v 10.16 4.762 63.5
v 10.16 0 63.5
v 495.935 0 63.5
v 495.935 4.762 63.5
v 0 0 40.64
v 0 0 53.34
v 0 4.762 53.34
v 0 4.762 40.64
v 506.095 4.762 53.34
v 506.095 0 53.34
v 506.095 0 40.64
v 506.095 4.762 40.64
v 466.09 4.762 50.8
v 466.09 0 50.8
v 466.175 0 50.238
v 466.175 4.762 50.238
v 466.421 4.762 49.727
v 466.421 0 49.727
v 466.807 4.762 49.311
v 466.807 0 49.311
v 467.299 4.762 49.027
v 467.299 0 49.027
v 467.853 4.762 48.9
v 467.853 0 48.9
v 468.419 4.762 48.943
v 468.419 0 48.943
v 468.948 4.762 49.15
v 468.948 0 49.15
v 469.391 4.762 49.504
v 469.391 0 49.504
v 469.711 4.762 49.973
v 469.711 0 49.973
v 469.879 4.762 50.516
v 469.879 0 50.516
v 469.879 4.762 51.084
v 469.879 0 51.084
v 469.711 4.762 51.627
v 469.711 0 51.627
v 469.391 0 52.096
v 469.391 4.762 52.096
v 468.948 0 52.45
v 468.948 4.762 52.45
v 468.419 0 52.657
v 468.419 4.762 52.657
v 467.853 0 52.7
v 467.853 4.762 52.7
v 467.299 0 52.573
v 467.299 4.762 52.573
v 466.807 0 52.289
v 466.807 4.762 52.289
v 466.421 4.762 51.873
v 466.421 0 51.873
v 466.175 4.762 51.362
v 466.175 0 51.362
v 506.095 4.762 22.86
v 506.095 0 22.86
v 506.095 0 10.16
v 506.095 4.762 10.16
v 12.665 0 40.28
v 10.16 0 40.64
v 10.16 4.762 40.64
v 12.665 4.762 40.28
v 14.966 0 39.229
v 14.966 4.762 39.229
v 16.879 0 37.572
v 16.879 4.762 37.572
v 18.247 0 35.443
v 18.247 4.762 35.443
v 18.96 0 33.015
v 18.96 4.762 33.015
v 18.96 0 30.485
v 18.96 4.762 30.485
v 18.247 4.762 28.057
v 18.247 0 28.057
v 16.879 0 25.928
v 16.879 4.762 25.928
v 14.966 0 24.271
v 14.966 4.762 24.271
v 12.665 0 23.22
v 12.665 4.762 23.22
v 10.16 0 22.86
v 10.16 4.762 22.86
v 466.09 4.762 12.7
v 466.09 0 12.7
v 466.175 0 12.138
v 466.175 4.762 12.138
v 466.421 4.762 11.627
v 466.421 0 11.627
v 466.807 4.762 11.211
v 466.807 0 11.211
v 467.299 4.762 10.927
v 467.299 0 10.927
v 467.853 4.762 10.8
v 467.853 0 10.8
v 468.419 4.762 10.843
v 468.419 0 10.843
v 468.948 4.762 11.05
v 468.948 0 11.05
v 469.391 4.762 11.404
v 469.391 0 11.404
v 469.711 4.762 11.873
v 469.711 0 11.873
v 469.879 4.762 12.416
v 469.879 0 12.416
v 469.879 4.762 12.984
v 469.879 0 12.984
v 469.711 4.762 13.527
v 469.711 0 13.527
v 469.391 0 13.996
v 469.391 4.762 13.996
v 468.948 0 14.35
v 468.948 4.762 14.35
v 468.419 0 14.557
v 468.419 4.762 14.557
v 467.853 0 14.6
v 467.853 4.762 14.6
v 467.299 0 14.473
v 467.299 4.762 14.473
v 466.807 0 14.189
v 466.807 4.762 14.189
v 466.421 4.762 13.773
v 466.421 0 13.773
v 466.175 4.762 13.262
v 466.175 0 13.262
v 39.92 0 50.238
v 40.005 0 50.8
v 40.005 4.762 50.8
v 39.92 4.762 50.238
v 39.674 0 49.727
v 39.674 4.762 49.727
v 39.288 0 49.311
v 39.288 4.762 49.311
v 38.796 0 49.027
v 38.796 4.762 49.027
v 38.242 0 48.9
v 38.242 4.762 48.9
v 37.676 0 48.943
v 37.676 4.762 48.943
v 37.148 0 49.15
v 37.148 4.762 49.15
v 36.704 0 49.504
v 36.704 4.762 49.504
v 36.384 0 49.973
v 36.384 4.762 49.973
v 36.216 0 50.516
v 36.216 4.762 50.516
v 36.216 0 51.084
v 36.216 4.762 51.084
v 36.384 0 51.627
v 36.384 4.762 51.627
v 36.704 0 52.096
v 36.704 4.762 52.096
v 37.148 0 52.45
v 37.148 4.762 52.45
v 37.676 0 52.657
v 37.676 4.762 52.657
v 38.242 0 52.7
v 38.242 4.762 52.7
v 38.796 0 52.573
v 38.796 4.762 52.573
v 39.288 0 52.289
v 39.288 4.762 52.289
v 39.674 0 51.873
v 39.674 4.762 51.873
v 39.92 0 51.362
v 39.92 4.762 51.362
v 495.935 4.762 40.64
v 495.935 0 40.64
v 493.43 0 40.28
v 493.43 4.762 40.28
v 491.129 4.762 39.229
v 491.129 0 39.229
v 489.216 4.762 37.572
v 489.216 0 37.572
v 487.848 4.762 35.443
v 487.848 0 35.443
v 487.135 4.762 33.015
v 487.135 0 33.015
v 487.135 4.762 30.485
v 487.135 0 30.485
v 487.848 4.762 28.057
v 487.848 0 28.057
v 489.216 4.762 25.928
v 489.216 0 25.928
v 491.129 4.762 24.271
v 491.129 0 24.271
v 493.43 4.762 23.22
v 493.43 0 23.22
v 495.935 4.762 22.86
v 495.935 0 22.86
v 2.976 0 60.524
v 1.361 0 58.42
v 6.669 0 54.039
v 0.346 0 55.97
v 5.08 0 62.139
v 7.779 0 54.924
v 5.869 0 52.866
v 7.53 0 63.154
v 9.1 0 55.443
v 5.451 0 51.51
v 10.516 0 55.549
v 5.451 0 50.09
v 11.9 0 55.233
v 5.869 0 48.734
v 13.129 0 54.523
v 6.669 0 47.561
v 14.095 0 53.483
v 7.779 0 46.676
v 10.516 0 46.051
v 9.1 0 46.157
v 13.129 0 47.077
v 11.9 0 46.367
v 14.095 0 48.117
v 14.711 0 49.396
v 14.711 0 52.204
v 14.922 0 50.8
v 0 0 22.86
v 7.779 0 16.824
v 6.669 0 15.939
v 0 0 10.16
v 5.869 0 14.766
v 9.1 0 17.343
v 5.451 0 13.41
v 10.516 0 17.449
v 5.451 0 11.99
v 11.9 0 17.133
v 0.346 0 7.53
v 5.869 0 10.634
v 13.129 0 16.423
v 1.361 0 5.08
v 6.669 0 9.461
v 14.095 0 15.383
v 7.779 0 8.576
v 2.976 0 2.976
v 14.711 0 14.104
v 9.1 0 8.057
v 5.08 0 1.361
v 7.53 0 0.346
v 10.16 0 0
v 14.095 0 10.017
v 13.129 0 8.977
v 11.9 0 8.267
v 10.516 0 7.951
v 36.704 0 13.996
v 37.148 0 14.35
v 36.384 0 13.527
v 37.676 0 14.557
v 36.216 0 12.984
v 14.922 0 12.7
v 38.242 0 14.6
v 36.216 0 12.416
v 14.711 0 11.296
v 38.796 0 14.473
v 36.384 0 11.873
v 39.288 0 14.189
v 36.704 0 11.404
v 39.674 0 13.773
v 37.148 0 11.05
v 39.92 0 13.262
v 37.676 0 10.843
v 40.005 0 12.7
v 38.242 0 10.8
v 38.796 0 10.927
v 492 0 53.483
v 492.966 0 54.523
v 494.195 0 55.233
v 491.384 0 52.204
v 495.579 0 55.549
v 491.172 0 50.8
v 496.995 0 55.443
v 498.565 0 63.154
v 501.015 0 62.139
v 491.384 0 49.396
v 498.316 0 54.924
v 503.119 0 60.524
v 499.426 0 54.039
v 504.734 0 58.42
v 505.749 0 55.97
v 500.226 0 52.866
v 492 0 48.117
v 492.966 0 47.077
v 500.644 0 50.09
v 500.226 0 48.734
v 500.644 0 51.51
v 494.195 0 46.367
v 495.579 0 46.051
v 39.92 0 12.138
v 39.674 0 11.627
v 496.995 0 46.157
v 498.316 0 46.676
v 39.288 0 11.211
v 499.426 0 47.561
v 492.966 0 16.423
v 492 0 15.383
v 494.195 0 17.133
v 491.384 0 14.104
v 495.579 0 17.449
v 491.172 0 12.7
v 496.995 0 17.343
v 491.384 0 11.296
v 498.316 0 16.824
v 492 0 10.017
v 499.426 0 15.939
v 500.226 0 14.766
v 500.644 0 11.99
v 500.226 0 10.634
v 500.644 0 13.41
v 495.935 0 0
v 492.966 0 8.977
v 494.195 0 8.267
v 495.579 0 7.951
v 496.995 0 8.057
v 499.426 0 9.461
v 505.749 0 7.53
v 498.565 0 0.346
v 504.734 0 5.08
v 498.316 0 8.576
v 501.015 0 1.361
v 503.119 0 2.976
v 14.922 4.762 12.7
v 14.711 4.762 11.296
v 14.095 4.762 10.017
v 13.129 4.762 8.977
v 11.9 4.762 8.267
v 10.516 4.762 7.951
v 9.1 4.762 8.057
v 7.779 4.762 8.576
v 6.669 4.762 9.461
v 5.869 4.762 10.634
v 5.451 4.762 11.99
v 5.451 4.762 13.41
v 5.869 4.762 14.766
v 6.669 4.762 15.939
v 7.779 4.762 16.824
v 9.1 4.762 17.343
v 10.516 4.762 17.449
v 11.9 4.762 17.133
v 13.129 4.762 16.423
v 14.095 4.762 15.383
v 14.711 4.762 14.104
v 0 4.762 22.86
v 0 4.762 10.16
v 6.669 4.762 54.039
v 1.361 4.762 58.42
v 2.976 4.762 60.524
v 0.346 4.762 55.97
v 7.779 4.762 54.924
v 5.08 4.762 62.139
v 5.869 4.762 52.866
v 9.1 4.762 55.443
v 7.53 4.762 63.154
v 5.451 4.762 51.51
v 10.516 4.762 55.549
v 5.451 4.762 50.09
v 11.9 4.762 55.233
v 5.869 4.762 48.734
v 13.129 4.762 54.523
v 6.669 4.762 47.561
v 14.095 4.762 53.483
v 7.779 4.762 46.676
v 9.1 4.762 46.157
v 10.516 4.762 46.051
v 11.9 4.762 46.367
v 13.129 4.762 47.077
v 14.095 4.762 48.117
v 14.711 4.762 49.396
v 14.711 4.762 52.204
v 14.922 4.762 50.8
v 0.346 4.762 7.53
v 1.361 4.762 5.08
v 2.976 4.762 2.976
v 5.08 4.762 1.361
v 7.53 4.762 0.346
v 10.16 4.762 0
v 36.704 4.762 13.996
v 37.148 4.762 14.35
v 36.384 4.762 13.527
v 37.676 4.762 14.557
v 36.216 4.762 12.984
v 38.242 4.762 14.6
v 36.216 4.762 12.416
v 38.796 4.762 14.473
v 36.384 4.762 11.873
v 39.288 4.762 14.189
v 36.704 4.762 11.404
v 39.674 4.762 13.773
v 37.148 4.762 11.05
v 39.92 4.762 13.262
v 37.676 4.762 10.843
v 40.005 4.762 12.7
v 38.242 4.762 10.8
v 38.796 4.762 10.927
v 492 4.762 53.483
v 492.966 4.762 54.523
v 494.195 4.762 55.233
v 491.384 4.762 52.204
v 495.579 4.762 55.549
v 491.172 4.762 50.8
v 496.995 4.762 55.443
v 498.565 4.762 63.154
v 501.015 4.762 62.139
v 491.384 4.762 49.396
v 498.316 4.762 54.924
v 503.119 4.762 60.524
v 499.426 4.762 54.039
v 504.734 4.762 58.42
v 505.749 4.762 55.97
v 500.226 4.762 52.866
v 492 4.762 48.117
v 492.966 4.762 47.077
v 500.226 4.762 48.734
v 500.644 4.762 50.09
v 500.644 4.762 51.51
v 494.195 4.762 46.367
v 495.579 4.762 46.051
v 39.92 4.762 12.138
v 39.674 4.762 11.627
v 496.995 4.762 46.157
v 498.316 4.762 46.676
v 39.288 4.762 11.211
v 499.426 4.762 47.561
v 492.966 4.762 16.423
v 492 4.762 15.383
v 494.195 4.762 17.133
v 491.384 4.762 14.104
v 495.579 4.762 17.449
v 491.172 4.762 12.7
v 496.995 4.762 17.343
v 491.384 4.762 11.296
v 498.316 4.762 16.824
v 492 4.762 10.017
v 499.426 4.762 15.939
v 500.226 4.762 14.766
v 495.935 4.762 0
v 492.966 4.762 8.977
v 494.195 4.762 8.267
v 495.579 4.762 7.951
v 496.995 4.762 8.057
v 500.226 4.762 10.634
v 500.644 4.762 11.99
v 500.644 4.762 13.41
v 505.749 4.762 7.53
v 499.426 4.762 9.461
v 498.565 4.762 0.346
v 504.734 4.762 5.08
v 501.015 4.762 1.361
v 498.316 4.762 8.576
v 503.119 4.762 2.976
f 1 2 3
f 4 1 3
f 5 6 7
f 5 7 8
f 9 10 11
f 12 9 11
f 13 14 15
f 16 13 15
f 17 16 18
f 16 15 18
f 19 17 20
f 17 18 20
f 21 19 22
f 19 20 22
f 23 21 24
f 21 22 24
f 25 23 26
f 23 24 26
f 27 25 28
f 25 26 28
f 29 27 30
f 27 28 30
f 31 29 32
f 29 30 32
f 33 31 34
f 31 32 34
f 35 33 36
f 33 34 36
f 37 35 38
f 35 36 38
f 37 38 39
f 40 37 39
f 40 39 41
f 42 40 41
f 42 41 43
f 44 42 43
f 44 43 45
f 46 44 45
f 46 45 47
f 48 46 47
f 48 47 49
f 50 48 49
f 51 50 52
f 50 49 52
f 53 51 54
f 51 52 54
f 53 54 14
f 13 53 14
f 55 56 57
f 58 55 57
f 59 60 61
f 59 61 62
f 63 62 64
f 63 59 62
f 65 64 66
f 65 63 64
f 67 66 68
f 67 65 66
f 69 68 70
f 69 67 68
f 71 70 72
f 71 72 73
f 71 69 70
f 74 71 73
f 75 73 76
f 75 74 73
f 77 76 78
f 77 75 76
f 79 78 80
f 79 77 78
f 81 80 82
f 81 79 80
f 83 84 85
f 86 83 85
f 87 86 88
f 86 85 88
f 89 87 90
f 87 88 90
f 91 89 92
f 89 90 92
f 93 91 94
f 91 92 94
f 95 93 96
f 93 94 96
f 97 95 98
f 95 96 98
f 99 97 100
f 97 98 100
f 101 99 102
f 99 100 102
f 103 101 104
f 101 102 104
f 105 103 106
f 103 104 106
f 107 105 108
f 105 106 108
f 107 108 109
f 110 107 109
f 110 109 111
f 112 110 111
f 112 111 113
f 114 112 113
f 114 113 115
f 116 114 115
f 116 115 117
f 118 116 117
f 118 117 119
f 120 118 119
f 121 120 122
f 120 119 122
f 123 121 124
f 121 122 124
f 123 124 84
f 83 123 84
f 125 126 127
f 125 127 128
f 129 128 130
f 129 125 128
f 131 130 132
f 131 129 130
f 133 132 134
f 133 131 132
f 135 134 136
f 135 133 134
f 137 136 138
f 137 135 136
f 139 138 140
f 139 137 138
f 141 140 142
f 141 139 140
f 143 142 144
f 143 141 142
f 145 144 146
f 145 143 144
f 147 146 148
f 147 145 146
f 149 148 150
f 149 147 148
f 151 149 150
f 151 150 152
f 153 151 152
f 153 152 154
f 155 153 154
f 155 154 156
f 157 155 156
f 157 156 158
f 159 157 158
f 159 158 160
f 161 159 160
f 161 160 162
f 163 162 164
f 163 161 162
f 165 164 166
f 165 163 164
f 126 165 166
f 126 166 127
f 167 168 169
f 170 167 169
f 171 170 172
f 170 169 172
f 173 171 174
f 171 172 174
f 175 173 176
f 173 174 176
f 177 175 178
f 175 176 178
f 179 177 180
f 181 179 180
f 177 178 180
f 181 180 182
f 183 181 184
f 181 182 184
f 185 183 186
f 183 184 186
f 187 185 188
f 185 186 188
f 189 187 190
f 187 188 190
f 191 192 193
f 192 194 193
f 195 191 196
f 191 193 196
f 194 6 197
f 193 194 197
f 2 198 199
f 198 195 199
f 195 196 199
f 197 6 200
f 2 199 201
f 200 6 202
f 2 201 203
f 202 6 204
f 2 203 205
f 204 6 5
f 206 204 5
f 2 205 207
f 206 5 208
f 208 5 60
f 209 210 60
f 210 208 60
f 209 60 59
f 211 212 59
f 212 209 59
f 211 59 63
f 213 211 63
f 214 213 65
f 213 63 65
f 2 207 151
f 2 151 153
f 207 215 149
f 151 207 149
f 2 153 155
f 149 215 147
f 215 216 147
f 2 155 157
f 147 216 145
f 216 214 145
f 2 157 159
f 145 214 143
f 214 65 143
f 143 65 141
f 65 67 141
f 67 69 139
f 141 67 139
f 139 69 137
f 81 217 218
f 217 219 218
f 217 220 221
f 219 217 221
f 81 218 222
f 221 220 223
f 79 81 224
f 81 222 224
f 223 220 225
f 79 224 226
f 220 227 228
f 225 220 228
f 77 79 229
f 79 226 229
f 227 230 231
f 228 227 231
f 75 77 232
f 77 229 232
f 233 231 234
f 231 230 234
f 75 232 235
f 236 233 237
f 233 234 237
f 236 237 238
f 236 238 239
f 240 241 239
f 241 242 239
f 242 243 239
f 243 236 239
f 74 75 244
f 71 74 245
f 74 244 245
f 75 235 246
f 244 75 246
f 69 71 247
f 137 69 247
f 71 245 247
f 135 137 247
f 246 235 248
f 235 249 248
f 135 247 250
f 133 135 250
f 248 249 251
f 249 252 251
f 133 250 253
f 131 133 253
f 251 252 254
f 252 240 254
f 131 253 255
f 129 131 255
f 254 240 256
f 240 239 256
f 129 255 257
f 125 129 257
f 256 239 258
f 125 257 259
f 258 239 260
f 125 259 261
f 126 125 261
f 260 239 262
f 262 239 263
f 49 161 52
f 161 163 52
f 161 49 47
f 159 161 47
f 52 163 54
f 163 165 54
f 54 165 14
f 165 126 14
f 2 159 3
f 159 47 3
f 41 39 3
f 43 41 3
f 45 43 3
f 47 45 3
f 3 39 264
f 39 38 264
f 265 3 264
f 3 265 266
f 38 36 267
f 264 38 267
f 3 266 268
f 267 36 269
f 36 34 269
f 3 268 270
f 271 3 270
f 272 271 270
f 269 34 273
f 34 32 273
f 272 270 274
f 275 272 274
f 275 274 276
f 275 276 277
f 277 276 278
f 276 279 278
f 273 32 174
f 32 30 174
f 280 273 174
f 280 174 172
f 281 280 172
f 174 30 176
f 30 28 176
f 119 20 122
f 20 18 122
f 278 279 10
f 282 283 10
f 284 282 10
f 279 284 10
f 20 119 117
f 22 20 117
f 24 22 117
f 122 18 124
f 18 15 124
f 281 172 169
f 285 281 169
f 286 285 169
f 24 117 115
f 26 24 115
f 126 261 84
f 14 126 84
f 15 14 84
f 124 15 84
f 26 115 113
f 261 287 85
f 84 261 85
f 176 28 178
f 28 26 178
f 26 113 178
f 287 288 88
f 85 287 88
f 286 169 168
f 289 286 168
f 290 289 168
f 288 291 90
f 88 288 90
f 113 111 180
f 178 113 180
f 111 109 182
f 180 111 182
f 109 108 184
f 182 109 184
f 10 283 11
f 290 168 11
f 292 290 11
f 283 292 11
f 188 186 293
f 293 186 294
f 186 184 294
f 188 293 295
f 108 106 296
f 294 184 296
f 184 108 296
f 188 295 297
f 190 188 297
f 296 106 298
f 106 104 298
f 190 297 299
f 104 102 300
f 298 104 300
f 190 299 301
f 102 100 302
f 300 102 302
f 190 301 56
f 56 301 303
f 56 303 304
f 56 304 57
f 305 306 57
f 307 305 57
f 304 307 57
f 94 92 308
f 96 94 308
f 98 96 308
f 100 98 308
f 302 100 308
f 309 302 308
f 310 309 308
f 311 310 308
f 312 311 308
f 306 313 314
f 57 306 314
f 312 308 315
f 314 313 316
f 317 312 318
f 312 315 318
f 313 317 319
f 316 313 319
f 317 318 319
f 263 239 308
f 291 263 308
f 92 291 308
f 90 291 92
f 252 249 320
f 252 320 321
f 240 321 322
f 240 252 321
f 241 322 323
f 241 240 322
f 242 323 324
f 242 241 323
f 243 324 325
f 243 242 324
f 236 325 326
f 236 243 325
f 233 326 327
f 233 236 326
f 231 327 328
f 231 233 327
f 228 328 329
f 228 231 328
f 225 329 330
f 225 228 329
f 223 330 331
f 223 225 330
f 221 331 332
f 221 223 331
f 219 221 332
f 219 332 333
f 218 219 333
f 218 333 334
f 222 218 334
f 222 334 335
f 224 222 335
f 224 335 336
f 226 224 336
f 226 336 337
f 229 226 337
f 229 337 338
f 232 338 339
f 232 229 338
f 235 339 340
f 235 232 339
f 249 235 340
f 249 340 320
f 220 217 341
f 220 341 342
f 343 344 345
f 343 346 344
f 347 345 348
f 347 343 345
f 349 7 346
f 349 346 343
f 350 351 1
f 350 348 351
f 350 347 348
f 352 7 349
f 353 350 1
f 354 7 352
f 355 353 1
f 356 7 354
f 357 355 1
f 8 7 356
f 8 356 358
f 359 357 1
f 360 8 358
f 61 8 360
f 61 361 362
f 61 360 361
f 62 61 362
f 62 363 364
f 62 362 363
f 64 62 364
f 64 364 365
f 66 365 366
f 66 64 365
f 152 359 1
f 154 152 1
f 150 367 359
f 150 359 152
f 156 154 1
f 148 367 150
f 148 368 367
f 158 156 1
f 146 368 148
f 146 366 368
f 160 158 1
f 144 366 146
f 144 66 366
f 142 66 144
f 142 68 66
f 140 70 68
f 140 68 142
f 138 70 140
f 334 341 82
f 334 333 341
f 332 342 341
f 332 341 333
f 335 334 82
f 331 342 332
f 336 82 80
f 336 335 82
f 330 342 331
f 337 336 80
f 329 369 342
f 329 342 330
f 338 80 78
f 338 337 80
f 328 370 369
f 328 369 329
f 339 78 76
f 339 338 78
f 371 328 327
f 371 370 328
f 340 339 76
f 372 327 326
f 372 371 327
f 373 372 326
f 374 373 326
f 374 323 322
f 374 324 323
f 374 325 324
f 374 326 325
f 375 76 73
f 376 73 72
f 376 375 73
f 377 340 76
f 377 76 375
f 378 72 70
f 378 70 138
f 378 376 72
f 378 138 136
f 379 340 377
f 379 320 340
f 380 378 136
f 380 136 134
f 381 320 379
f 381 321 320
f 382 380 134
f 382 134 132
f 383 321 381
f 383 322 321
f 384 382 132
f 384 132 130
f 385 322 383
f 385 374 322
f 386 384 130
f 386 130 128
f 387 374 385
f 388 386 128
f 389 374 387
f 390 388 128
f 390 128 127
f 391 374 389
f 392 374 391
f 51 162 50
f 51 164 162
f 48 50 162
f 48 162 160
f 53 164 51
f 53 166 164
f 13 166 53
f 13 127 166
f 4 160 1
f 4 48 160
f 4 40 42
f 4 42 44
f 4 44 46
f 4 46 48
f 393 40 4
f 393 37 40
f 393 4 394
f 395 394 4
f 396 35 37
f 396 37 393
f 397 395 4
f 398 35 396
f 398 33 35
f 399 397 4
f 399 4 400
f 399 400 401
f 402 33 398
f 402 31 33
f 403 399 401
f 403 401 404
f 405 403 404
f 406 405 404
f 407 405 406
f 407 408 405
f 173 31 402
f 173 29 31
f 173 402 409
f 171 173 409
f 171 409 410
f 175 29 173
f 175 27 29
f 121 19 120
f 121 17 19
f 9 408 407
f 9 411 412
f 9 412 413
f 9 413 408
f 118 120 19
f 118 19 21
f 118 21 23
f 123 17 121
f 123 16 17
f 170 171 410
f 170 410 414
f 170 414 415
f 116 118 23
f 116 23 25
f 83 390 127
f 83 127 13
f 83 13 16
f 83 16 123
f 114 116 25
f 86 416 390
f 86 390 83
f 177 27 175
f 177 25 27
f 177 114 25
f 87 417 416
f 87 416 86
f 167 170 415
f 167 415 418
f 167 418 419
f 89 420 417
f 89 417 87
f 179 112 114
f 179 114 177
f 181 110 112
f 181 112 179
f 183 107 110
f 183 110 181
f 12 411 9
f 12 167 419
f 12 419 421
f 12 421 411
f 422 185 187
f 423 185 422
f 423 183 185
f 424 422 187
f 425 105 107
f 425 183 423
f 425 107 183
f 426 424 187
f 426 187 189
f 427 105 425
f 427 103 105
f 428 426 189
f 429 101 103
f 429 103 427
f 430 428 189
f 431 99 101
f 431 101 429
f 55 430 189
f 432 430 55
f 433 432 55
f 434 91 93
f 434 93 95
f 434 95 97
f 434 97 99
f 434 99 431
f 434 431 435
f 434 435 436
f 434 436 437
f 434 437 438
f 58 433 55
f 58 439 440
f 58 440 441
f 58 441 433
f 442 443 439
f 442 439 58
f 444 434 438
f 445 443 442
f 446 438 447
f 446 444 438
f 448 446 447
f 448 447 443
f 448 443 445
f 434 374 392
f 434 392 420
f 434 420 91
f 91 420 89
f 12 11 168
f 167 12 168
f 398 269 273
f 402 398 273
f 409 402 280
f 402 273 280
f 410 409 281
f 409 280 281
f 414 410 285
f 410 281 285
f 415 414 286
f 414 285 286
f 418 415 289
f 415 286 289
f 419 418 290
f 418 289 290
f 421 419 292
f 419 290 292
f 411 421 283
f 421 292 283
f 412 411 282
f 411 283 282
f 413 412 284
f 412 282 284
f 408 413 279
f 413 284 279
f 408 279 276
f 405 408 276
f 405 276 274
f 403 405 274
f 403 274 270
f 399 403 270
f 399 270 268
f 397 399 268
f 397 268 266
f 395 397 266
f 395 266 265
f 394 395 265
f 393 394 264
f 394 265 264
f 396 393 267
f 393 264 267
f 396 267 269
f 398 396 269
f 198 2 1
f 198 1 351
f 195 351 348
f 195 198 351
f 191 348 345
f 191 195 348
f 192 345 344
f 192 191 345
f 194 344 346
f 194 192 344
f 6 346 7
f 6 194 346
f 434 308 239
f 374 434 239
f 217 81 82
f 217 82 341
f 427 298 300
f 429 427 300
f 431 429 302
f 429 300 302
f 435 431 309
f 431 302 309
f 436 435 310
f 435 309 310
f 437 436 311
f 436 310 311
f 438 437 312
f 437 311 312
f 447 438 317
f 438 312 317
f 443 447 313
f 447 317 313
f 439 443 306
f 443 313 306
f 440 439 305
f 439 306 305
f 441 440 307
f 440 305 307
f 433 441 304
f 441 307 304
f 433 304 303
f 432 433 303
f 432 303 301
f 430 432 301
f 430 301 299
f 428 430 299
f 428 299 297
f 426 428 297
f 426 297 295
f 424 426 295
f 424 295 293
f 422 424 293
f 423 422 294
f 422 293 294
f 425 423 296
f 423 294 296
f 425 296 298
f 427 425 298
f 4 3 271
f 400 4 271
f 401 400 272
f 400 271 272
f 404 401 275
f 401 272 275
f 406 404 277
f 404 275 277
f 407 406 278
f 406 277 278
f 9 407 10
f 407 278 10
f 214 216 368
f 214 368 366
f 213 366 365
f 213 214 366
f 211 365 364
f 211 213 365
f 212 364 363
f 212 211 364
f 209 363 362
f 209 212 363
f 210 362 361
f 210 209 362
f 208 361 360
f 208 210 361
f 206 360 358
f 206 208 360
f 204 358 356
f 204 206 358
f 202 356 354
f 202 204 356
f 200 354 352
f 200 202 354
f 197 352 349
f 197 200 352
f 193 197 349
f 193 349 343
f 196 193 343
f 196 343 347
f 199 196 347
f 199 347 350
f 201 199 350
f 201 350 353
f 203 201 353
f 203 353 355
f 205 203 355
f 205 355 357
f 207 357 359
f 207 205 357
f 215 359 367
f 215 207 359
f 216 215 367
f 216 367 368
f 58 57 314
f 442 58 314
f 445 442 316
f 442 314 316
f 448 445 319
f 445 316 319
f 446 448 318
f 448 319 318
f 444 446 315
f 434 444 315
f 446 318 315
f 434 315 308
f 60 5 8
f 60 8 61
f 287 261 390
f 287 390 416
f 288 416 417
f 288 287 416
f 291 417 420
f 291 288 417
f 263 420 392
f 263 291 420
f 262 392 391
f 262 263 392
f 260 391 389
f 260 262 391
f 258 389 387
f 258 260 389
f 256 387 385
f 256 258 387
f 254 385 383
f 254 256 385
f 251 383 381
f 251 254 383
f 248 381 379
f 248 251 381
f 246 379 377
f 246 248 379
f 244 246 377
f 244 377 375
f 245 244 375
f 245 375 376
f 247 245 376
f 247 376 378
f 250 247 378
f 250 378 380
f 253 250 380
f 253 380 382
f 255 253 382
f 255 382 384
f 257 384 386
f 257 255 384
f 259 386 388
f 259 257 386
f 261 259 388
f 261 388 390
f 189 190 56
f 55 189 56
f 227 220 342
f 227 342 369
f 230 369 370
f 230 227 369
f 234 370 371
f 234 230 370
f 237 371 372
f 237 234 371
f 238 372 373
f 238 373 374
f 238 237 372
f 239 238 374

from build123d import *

# Parameters (mm, degrees)
SKETCH1_R           = 4.7625
SKETCH1_R_2         = 1.905
BOSS_EXTRUDE1_DEPTH = 4.7625


with BuildPart() as part:
    # Sketch1 → Boss-Extrude1 (new body)
    with BuildSketch(Plane(origin=(0, 0, 0), x_dir=(1, 0, 0), z_dir=(0, 1, 0))):
        with BuildLine():
            Line((10.16, 0), (253.0475, 0))
            Line((253.0475, 0), (253.0475, -63.5))
            Line((253.0475, -63.5), (10.16, -63.5))
            ThreePointArc((10.16, -63.5), (2.975795103, -60.524204897), (0, -53.34))
            Line((0, -53.34), (0, -40.64))
            Line((0, -40.64), (10.16, -40.64))
            ThreePointArc((10.16, -40.64), (19.05, -31.75), (10.16, -22.86))
            Line((10.16, -22.86), (0, -22.86))
            Line((0, -22.86), (0, -10.16))
            ThreePointArc((0, -10.16), (2.975795103, -2.975795103), (10.16, 0))
        make_face()
        with Locations((10.16, -50.8)):
            Circle(SKETCH1_R, mode=Mode.SUBTRACT)
        with Locations((10.16, -12.7)):
            Circle(SKETCH1_R, mode=Mode.SUBTRACT)
        with Locations((38.1, -50.8)):
            Circle(SKETCH1_R_2, mode=Mode.SUBTRACT)
        with Locations((38.1, -12.7)):
            Circle(SKETCH1_R_2, mode=Mode.SUBTRACT)
    boss_extrude1 = extrude(amount=BOSS_EXTRUDE1_DEPTH)

    # Mirror1: Boss-Extrude1 across plane
    add(boss_extrude1.mirror(Plane(origin=(253.0475, 4.7625, 63.5), x_dir=(0, 0, 1), z_dir=(-1, 0, 0))))


solid = part.part
